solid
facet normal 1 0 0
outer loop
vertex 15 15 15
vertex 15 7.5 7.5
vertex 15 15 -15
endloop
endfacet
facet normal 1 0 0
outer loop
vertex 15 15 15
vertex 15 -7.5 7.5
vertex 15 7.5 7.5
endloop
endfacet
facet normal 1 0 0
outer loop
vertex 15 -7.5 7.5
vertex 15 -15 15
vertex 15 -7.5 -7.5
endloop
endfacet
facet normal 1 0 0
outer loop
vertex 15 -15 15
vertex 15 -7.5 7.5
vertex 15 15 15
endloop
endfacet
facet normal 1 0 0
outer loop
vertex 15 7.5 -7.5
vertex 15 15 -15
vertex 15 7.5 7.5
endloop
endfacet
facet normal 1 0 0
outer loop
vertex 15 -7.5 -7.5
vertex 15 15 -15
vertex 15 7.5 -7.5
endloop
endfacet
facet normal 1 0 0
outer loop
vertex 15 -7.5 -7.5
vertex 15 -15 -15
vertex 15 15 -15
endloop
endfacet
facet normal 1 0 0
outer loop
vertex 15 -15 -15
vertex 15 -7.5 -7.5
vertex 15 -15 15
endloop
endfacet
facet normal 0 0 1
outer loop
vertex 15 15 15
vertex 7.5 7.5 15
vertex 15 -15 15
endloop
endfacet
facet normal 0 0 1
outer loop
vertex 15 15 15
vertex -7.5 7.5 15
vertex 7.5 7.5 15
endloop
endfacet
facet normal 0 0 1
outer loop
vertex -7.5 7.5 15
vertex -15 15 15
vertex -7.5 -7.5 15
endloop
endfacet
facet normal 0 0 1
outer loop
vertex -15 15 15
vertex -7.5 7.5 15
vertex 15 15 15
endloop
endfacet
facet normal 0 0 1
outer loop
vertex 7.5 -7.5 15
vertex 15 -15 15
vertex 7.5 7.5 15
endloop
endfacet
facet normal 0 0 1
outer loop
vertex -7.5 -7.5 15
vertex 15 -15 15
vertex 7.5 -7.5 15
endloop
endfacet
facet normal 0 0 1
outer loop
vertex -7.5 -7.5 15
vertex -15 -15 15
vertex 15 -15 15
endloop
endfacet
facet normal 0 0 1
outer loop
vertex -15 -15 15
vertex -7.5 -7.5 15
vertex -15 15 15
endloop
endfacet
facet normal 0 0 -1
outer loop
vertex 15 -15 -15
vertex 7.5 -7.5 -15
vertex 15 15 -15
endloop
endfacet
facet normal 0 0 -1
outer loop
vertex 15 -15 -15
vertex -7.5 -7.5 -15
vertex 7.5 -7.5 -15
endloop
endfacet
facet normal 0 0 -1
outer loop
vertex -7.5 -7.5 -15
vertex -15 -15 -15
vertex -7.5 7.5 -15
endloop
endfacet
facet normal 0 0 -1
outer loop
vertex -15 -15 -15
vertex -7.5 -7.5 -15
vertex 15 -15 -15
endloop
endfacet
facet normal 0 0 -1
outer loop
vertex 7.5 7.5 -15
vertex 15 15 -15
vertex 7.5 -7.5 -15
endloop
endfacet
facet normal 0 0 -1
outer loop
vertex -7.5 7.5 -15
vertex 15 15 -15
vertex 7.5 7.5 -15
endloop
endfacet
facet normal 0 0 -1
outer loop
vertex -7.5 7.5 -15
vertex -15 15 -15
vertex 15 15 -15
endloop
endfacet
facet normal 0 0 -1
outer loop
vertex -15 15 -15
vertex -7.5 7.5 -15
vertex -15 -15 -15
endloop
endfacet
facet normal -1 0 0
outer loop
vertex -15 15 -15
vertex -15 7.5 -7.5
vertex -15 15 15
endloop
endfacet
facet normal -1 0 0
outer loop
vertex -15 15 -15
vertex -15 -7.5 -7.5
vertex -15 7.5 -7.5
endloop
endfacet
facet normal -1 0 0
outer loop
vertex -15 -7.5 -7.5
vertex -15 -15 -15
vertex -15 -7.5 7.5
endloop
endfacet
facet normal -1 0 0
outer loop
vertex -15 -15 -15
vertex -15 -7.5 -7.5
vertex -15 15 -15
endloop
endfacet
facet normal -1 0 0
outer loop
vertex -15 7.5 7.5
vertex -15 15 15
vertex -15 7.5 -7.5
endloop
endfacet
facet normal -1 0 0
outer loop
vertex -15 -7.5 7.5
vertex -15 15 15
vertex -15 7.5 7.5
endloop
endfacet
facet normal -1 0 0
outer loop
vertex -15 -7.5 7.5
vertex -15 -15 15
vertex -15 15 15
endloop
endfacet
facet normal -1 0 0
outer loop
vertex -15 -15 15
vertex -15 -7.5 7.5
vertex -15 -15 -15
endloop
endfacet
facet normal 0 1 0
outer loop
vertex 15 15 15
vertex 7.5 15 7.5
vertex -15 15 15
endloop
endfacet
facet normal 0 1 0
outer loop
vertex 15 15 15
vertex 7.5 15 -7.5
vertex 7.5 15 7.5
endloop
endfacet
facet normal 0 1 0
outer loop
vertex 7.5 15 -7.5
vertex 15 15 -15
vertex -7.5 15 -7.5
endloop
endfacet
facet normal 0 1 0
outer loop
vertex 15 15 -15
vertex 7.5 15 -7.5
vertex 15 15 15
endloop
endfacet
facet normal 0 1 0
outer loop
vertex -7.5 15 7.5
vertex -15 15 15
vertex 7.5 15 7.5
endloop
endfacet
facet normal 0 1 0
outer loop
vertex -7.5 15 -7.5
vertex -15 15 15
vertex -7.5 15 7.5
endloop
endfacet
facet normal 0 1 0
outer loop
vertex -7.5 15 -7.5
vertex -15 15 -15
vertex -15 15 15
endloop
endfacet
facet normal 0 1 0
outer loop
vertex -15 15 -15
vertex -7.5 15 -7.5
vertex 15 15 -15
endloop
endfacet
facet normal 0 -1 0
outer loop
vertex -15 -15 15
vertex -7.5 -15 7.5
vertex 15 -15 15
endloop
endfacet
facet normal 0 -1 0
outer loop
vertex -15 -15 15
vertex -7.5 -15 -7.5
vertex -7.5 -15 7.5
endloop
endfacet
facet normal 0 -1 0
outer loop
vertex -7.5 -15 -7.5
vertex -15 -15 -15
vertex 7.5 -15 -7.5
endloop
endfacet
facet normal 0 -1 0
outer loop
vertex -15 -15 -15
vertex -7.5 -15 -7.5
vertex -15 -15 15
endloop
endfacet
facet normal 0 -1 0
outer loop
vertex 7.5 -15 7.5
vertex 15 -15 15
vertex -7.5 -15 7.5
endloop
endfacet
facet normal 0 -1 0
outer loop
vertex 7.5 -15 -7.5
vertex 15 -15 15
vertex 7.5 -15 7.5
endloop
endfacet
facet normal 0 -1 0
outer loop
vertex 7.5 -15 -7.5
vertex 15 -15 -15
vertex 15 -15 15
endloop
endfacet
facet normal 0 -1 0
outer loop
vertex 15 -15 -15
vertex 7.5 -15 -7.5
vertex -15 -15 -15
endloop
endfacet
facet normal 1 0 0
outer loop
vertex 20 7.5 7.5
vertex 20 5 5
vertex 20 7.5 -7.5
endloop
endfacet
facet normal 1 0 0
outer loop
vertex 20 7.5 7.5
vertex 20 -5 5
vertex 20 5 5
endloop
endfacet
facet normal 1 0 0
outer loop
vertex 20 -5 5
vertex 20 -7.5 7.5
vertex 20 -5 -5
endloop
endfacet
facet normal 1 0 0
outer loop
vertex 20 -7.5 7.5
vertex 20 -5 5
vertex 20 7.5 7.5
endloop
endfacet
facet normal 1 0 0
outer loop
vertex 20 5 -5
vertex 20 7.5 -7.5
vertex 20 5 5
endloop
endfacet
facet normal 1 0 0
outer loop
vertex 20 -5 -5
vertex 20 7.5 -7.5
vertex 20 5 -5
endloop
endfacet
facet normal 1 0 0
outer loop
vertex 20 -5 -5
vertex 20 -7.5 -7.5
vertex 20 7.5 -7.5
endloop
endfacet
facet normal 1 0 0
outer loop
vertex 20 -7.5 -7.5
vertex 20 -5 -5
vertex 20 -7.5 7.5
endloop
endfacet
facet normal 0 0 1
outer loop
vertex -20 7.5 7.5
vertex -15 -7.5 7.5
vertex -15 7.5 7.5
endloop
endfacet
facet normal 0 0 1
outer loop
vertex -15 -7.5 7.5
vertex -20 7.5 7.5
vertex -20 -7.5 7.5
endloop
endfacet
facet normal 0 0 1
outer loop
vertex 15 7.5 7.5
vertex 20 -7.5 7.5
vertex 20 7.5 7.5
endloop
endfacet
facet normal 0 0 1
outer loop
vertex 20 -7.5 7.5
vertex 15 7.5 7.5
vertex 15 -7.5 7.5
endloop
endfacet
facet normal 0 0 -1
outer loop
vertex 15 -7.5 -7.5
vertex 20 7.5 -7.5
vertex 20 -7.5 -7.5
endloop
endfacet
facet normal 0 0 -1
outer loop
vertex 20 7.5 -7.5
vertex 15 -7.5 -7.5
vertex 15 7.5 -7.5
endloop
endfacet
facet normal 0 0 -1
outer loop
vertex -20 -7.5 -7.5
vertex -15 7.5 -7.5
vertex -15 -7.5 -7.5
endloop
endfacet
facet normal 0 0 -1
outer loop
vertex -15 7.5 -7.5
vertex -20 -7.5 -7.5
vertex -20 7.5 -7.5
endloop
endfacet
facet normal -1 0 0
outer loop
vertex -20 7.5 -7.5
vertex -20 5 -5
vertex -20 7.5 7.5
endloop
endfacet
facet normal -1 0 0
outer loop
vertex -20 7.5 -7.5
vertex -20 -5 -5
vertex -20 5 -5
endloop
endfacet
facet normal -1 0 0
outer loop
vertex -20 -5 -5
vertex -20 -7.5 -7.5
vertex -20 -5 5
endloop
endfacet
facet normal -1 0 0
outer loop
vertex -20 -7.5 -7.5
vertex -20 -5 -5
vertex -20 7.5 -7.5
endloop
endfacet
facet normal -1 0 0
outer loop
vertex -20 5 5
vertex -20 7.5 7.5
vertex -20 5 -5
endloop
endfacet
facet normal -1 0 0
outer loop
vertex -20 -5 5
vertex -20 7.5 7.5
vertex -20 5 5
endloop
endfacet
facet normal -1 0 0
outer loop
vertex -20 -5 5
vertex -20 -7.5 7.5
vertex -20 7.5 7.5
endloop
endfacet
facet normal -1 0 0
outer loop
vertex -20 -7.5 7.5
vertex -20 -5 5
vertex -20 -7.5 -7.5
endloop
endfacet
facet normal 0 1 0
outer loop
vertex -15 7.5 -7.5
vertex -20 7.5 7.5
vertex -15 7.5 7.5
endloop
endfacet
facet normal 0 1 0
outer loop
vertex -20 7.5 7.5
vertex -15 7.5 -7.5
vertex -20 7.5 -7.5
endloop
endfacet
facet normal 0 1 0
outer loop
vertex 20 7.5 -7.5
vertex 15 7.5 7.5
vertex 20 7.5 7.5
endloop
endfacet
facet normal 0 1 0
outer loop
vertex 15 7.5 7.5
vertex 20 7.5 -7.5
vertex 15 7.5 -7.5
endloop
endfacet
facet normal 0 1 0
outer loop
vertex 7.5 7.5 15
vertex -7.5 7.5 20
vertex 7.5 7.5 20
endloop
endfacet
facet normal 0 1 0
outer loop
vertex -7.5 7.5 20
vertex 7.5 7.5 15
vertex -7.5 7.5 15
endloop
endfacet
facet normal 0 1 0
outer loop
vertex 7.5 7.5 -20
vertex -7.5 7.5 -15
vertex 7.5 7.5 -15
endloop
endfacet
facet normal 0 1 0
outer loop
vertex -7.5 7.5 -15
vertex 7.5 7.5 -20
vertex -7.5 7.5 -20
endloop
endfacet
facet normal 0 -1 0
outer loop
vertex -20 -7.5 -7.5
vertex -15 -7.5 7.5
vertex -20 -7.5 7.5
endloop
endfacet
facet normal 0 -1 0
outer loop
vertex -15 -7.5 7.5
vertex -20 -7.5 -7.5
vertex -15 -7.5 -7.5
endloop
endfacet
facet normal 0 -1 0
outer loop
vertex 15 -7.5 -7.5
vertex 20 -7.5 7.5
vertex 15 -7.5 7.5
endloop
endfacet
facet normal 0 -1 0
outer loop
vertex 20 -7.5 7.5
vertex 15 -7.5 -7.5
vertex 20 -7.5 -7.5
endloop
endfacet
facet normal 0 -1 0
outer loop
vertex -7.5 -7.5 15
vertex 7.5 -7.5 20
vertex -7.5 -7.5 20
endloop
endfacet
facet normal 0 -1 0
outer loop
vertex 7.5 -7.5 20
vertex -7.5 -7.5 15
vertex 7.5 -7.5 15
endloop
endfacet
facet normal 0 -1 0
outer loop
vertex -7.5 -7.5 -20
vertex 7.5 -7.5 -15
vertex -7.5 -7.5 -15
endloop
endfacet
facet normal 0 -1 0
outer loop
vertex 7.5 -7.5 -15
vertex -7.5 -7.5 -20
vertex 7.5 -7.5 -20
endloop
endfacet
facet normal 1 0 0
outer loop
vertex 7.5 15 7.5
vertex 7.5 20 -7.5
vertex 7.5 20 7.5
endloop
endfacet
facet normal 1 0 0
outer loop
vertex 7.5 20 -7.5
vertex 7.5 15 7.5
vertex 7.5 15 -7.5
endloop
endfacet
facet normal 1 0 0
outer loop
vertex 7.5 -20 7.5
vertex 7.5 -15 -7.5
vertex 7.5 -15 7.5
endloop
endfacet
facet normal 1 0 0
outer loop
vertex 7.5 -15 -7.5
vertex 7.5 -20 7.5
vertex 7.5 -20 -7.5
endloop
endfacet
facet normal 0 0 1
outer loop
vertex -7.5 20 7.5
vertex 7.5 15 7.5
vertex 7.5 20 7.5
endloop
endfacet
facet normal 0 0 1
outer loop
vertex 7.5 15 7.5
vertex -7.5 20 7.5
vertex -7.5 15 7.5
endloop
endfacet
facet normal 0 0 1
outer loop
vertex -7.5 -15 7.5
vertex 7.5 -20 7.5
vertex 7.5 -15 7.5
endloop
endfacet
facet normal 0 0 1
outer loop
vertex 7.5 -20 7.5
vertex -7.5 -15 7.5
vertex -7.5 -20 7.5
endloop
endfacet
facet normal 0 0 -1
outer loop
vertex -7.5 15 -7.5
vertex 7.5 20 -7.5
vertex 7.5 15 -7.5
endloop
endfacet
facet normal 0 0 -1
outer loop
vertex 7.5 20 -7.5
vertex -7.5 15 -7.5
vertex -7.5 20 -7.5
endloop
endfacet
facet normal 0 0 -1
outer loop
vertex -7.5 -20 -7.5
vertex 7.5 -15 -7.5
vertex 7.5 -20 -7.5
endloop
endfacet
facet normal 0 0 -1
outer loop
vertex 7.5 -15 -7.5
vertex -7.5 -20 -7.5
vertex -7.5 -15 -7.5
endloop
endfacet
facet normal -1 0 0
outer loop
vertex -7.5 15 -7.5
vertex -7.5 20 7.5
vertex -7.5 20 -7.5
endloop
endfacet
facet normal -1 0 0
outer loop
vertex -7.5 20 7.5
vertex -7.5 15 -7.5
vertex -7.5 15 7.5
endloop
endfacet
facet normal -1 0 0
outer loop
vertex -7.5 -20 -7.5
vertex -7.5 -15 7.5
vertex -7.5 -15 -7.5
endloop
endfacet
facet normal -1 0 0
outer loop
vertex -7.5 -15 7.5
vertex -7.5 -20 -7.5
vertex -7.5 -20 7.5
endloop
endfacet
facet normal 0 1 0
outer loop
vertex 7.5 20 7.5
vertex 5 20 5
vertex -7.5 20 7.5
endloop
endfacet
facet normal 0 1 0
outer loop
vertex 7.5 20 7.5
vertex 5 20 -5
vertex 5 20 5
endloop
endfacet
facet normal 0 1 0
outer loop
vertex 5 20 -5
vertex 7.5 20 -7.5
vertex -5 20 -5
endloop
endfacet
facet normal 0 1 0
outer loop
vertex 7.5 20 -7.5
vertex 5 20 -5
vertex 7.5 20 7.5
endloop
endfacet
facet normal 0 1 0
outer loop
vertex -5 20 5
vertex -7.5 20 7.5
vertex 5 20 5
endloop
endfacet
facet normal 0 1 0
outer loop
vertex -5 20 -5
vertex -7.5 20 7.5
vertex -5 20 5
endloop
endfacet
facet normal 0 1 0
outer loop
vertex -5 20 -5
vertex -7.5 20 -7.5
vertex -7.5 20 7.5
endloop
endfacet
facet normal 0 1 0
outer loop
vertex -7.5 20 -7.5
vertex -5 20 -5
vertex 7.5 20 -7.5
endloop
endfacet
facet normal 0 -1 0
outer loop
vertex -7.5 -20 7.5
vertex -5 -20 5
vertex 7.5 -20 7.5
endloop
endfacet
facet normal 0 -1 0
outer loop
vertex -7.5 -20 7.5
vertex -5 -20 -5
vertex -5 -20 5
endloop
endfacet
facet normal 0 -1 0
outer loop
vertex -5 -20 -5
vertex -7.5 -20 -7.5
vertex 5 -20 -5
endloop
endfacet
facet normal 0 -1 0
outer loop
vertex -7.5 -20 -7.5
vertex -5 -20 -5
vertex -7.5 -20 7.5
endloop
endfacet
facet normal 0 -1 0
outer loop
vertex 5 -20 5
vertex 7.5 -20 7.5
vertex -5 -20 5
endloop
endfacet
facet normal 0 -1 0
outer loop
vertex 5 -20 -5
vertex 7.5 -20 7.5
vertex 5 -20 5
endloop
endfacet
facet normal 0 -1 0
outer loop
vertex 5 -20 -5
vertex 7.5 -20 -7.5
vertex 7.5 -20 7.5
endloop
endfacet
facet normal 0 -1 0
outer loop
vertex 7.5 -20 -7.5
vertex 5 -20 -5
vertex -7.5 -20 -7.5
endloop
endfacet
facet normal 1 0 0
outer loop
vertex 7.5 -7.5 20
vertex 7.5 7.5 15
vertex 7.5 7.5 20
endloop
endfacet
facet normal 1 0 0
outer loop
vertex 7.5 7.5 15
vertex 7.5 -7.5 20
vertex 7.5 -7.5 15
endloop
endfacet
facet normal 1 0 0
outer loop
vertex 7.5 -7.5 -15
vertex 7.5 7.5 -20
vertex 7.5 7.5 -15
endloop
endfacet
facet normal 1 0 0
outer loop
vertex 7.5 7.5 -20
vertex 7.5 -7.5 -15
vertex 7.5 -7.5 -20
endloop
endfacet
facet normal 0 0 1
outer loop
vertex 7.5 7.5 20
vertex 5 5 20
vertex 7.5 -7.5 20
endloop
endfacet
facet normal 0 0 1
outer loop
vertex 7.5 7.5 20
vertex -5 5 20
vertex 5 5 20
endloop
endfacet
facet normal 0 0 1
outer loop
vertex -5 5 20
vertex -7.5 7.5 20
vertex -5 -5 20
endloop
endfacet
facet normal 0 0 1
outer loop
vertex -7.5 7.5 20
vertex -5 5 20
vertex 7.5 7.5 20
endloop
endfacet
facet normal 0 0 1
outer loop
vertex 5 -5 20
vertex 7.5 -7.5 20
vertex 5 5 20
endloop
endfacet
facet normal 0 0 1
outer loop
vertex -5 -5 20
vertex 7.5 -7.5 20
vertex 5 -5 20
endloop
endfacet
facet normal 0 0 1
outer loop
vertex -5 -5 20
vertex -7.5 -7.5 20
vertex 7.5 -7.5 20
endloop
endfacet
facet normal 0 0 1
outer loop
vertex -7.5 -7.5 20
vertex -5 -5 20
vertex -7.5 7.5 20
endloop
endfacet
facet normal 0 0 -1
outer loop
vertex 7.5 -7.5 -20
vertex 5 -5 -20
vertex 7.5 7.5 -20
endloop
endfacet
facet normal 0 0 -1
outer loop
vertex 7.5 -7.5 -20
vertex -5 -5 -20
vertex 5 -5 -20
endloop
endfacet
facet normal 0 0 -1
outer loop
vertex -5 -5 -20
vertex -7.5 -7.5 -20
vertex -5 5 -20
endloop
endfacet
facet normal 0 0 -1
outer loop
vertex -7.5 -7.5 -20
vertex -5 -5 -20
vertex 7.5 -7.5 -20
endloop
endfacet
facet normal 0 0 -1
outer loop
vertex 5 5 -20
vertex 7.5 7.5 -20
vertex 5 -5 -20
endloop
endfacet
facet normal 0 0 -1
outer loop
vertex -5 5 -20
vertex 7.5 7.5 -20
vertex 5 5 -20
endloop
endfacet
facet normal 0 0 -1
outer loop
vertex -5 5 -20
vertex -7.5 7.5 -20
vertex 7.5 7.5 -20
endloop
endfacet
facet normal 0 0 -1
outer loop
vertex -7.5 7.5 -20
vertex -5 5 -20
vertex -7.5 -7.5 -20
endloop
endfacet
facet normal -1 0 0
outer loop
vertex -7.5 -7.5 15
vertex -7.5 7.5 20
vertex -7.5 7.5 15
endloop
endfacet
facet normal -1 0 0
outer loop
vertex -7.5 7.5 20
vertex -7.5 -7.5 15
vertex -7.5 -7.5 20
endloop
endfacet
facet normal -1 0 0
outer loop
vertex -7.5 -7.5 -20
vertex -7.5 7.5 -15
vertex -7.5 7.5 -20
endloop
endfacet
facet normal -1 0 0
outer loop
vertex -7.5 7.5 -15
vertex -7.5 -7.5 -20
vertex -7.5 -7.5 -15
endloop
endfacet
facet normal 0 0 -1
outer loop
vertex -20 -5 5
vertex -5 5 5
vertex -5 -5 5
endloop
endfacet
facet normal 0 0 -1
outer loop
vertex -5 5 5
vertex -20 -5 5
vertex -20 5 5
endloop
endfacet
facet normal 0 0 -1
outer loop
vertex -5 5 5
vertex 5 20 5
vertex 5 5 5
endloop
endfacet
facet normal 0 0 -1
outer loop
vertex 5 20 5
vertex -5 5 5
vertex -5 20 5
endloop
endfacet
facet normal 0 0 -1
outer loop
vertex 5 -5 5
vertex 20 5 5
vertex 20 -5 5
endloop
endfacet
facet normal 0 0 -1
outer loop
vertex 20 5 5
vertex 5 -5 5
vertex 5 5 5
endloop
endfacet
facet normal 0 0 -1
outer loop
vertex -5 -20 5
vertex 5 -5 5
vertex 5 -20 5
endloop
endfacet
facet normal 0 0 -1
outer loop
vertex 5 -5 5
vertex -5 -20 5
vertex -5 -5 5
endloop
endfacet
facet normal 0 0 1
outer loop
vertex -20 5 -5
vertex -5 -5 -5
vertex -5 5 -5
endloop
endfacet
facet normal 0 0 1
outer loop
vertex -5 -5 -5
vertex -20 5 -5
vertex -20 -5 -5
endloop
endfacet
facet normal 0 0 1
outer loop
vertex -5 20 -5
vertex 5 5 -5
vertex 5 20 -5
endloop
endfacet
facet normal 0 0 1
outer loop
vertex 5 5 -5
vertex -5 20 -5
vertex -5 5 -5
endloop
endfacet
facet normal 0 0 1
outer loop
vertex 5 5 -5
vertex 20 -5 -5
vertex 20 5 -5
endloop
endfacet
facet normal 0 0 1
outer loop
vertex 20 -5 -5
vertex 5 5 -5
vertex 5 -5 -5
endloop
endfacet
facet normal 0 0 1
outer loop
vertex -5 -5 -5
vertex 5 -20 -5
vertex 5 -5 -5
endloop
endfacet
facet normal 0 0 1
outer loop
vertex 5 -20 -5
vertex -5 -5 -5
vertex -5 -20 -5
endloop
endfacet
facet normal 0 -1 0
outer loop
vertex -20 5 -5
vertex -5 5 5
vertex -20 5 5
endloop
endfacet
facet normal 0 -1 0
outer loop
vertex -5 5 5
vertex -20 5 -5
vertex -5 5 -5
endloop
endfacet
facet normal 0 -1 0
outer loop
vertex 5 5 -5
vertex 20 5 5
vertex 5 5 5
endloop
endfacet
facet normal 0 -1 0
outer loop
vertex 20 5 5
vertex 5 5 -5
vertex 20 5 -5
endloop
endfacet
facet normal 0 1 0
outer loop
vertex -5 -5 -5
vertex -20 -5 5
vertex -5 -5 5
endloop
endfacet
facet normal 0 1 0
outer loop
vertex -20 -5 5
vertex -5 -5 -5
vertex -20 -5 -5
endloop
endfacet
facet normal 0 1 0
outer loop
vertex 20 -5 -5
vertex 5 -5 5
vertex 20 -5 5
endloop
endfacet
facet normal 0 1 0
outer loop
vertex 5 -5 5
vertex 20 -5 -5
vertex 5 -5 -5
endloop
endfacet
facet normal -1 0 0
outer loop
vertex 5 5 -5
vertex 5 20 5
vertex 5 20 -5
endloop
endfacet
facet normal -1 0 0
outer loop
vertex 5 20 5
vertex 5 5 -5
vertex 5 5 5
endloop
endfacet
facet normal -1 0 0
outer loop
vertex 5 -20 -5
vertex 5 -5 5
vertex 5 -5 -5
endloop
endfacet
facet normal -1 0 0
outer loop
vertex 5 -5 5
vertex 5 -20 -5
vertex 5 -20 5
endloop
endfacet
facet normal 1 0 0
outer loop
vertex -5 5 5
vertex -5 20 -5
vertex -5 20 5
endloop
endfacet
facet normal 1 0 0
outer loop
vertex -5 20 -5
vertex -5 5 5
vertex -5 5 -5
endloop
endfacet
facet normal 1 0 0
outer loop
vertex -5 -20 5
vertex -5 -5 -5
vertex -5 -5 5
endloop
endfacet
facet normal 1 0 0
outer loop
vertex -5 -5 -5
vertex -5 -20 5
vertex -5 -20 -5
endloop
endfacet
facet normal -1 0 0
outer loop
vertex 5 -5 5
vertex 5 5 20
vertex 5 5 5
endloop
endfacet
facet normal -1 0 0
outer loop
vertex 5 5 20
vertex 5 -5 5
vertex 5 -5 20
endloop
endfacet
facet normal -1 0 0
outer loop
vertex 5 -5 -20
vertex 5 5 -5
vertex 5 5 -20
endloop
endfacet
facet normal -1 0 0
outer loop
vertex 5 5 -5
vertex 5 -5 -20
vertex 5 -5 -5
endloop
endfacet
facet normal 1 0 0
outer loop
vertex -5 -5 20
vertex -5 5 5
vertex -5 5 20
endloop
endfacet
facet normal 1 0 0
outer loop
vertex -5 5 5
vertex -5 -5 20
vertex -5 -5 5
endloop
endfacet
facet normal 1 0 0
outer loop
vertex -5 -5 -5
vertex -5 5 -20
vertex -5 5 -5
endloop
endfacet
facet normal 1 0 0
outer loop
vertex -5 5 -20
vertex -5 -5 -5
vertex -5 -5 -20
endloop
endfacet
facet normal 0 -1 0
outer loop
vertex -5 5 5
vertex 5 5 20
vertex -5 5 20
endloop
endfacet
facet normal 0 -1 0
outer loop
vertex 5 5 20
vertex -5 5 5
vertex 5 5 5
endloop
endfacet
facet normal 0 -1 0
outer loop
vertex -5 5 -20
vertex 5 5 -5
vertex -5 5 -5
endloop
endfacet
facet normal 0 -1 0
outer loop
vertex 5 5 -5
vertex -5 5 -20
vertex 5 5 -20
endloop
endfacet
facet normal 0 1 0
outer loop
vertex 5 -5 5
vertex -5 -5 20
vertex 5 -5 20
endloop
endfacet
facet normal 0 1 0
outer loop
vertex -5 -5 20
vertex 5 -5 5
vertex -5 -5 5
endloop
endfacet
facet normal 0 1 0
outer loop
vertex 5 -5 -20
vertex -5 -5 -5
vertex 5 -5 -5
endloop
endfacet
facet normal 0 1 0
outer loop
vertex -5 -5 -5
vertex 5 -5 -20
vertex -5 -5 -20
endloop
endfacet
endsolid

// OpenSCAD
module example003()
{
	difference() {
		union() {
			cube(size=[30, 30, 30], center = true);
			cube(size=[40, 15, 15], center = true);
			cube(size=[15, 40, 15], center = true);
			cube(size=[15, 15, 40], center = true);
		}
		union() {
			cube(size=[50, 10, 10], center = true);
			cube(size=[10, 50, 10], center = true);
			cube(size=[10, 10, 50], center = true);
		}
	}
}

example003();
